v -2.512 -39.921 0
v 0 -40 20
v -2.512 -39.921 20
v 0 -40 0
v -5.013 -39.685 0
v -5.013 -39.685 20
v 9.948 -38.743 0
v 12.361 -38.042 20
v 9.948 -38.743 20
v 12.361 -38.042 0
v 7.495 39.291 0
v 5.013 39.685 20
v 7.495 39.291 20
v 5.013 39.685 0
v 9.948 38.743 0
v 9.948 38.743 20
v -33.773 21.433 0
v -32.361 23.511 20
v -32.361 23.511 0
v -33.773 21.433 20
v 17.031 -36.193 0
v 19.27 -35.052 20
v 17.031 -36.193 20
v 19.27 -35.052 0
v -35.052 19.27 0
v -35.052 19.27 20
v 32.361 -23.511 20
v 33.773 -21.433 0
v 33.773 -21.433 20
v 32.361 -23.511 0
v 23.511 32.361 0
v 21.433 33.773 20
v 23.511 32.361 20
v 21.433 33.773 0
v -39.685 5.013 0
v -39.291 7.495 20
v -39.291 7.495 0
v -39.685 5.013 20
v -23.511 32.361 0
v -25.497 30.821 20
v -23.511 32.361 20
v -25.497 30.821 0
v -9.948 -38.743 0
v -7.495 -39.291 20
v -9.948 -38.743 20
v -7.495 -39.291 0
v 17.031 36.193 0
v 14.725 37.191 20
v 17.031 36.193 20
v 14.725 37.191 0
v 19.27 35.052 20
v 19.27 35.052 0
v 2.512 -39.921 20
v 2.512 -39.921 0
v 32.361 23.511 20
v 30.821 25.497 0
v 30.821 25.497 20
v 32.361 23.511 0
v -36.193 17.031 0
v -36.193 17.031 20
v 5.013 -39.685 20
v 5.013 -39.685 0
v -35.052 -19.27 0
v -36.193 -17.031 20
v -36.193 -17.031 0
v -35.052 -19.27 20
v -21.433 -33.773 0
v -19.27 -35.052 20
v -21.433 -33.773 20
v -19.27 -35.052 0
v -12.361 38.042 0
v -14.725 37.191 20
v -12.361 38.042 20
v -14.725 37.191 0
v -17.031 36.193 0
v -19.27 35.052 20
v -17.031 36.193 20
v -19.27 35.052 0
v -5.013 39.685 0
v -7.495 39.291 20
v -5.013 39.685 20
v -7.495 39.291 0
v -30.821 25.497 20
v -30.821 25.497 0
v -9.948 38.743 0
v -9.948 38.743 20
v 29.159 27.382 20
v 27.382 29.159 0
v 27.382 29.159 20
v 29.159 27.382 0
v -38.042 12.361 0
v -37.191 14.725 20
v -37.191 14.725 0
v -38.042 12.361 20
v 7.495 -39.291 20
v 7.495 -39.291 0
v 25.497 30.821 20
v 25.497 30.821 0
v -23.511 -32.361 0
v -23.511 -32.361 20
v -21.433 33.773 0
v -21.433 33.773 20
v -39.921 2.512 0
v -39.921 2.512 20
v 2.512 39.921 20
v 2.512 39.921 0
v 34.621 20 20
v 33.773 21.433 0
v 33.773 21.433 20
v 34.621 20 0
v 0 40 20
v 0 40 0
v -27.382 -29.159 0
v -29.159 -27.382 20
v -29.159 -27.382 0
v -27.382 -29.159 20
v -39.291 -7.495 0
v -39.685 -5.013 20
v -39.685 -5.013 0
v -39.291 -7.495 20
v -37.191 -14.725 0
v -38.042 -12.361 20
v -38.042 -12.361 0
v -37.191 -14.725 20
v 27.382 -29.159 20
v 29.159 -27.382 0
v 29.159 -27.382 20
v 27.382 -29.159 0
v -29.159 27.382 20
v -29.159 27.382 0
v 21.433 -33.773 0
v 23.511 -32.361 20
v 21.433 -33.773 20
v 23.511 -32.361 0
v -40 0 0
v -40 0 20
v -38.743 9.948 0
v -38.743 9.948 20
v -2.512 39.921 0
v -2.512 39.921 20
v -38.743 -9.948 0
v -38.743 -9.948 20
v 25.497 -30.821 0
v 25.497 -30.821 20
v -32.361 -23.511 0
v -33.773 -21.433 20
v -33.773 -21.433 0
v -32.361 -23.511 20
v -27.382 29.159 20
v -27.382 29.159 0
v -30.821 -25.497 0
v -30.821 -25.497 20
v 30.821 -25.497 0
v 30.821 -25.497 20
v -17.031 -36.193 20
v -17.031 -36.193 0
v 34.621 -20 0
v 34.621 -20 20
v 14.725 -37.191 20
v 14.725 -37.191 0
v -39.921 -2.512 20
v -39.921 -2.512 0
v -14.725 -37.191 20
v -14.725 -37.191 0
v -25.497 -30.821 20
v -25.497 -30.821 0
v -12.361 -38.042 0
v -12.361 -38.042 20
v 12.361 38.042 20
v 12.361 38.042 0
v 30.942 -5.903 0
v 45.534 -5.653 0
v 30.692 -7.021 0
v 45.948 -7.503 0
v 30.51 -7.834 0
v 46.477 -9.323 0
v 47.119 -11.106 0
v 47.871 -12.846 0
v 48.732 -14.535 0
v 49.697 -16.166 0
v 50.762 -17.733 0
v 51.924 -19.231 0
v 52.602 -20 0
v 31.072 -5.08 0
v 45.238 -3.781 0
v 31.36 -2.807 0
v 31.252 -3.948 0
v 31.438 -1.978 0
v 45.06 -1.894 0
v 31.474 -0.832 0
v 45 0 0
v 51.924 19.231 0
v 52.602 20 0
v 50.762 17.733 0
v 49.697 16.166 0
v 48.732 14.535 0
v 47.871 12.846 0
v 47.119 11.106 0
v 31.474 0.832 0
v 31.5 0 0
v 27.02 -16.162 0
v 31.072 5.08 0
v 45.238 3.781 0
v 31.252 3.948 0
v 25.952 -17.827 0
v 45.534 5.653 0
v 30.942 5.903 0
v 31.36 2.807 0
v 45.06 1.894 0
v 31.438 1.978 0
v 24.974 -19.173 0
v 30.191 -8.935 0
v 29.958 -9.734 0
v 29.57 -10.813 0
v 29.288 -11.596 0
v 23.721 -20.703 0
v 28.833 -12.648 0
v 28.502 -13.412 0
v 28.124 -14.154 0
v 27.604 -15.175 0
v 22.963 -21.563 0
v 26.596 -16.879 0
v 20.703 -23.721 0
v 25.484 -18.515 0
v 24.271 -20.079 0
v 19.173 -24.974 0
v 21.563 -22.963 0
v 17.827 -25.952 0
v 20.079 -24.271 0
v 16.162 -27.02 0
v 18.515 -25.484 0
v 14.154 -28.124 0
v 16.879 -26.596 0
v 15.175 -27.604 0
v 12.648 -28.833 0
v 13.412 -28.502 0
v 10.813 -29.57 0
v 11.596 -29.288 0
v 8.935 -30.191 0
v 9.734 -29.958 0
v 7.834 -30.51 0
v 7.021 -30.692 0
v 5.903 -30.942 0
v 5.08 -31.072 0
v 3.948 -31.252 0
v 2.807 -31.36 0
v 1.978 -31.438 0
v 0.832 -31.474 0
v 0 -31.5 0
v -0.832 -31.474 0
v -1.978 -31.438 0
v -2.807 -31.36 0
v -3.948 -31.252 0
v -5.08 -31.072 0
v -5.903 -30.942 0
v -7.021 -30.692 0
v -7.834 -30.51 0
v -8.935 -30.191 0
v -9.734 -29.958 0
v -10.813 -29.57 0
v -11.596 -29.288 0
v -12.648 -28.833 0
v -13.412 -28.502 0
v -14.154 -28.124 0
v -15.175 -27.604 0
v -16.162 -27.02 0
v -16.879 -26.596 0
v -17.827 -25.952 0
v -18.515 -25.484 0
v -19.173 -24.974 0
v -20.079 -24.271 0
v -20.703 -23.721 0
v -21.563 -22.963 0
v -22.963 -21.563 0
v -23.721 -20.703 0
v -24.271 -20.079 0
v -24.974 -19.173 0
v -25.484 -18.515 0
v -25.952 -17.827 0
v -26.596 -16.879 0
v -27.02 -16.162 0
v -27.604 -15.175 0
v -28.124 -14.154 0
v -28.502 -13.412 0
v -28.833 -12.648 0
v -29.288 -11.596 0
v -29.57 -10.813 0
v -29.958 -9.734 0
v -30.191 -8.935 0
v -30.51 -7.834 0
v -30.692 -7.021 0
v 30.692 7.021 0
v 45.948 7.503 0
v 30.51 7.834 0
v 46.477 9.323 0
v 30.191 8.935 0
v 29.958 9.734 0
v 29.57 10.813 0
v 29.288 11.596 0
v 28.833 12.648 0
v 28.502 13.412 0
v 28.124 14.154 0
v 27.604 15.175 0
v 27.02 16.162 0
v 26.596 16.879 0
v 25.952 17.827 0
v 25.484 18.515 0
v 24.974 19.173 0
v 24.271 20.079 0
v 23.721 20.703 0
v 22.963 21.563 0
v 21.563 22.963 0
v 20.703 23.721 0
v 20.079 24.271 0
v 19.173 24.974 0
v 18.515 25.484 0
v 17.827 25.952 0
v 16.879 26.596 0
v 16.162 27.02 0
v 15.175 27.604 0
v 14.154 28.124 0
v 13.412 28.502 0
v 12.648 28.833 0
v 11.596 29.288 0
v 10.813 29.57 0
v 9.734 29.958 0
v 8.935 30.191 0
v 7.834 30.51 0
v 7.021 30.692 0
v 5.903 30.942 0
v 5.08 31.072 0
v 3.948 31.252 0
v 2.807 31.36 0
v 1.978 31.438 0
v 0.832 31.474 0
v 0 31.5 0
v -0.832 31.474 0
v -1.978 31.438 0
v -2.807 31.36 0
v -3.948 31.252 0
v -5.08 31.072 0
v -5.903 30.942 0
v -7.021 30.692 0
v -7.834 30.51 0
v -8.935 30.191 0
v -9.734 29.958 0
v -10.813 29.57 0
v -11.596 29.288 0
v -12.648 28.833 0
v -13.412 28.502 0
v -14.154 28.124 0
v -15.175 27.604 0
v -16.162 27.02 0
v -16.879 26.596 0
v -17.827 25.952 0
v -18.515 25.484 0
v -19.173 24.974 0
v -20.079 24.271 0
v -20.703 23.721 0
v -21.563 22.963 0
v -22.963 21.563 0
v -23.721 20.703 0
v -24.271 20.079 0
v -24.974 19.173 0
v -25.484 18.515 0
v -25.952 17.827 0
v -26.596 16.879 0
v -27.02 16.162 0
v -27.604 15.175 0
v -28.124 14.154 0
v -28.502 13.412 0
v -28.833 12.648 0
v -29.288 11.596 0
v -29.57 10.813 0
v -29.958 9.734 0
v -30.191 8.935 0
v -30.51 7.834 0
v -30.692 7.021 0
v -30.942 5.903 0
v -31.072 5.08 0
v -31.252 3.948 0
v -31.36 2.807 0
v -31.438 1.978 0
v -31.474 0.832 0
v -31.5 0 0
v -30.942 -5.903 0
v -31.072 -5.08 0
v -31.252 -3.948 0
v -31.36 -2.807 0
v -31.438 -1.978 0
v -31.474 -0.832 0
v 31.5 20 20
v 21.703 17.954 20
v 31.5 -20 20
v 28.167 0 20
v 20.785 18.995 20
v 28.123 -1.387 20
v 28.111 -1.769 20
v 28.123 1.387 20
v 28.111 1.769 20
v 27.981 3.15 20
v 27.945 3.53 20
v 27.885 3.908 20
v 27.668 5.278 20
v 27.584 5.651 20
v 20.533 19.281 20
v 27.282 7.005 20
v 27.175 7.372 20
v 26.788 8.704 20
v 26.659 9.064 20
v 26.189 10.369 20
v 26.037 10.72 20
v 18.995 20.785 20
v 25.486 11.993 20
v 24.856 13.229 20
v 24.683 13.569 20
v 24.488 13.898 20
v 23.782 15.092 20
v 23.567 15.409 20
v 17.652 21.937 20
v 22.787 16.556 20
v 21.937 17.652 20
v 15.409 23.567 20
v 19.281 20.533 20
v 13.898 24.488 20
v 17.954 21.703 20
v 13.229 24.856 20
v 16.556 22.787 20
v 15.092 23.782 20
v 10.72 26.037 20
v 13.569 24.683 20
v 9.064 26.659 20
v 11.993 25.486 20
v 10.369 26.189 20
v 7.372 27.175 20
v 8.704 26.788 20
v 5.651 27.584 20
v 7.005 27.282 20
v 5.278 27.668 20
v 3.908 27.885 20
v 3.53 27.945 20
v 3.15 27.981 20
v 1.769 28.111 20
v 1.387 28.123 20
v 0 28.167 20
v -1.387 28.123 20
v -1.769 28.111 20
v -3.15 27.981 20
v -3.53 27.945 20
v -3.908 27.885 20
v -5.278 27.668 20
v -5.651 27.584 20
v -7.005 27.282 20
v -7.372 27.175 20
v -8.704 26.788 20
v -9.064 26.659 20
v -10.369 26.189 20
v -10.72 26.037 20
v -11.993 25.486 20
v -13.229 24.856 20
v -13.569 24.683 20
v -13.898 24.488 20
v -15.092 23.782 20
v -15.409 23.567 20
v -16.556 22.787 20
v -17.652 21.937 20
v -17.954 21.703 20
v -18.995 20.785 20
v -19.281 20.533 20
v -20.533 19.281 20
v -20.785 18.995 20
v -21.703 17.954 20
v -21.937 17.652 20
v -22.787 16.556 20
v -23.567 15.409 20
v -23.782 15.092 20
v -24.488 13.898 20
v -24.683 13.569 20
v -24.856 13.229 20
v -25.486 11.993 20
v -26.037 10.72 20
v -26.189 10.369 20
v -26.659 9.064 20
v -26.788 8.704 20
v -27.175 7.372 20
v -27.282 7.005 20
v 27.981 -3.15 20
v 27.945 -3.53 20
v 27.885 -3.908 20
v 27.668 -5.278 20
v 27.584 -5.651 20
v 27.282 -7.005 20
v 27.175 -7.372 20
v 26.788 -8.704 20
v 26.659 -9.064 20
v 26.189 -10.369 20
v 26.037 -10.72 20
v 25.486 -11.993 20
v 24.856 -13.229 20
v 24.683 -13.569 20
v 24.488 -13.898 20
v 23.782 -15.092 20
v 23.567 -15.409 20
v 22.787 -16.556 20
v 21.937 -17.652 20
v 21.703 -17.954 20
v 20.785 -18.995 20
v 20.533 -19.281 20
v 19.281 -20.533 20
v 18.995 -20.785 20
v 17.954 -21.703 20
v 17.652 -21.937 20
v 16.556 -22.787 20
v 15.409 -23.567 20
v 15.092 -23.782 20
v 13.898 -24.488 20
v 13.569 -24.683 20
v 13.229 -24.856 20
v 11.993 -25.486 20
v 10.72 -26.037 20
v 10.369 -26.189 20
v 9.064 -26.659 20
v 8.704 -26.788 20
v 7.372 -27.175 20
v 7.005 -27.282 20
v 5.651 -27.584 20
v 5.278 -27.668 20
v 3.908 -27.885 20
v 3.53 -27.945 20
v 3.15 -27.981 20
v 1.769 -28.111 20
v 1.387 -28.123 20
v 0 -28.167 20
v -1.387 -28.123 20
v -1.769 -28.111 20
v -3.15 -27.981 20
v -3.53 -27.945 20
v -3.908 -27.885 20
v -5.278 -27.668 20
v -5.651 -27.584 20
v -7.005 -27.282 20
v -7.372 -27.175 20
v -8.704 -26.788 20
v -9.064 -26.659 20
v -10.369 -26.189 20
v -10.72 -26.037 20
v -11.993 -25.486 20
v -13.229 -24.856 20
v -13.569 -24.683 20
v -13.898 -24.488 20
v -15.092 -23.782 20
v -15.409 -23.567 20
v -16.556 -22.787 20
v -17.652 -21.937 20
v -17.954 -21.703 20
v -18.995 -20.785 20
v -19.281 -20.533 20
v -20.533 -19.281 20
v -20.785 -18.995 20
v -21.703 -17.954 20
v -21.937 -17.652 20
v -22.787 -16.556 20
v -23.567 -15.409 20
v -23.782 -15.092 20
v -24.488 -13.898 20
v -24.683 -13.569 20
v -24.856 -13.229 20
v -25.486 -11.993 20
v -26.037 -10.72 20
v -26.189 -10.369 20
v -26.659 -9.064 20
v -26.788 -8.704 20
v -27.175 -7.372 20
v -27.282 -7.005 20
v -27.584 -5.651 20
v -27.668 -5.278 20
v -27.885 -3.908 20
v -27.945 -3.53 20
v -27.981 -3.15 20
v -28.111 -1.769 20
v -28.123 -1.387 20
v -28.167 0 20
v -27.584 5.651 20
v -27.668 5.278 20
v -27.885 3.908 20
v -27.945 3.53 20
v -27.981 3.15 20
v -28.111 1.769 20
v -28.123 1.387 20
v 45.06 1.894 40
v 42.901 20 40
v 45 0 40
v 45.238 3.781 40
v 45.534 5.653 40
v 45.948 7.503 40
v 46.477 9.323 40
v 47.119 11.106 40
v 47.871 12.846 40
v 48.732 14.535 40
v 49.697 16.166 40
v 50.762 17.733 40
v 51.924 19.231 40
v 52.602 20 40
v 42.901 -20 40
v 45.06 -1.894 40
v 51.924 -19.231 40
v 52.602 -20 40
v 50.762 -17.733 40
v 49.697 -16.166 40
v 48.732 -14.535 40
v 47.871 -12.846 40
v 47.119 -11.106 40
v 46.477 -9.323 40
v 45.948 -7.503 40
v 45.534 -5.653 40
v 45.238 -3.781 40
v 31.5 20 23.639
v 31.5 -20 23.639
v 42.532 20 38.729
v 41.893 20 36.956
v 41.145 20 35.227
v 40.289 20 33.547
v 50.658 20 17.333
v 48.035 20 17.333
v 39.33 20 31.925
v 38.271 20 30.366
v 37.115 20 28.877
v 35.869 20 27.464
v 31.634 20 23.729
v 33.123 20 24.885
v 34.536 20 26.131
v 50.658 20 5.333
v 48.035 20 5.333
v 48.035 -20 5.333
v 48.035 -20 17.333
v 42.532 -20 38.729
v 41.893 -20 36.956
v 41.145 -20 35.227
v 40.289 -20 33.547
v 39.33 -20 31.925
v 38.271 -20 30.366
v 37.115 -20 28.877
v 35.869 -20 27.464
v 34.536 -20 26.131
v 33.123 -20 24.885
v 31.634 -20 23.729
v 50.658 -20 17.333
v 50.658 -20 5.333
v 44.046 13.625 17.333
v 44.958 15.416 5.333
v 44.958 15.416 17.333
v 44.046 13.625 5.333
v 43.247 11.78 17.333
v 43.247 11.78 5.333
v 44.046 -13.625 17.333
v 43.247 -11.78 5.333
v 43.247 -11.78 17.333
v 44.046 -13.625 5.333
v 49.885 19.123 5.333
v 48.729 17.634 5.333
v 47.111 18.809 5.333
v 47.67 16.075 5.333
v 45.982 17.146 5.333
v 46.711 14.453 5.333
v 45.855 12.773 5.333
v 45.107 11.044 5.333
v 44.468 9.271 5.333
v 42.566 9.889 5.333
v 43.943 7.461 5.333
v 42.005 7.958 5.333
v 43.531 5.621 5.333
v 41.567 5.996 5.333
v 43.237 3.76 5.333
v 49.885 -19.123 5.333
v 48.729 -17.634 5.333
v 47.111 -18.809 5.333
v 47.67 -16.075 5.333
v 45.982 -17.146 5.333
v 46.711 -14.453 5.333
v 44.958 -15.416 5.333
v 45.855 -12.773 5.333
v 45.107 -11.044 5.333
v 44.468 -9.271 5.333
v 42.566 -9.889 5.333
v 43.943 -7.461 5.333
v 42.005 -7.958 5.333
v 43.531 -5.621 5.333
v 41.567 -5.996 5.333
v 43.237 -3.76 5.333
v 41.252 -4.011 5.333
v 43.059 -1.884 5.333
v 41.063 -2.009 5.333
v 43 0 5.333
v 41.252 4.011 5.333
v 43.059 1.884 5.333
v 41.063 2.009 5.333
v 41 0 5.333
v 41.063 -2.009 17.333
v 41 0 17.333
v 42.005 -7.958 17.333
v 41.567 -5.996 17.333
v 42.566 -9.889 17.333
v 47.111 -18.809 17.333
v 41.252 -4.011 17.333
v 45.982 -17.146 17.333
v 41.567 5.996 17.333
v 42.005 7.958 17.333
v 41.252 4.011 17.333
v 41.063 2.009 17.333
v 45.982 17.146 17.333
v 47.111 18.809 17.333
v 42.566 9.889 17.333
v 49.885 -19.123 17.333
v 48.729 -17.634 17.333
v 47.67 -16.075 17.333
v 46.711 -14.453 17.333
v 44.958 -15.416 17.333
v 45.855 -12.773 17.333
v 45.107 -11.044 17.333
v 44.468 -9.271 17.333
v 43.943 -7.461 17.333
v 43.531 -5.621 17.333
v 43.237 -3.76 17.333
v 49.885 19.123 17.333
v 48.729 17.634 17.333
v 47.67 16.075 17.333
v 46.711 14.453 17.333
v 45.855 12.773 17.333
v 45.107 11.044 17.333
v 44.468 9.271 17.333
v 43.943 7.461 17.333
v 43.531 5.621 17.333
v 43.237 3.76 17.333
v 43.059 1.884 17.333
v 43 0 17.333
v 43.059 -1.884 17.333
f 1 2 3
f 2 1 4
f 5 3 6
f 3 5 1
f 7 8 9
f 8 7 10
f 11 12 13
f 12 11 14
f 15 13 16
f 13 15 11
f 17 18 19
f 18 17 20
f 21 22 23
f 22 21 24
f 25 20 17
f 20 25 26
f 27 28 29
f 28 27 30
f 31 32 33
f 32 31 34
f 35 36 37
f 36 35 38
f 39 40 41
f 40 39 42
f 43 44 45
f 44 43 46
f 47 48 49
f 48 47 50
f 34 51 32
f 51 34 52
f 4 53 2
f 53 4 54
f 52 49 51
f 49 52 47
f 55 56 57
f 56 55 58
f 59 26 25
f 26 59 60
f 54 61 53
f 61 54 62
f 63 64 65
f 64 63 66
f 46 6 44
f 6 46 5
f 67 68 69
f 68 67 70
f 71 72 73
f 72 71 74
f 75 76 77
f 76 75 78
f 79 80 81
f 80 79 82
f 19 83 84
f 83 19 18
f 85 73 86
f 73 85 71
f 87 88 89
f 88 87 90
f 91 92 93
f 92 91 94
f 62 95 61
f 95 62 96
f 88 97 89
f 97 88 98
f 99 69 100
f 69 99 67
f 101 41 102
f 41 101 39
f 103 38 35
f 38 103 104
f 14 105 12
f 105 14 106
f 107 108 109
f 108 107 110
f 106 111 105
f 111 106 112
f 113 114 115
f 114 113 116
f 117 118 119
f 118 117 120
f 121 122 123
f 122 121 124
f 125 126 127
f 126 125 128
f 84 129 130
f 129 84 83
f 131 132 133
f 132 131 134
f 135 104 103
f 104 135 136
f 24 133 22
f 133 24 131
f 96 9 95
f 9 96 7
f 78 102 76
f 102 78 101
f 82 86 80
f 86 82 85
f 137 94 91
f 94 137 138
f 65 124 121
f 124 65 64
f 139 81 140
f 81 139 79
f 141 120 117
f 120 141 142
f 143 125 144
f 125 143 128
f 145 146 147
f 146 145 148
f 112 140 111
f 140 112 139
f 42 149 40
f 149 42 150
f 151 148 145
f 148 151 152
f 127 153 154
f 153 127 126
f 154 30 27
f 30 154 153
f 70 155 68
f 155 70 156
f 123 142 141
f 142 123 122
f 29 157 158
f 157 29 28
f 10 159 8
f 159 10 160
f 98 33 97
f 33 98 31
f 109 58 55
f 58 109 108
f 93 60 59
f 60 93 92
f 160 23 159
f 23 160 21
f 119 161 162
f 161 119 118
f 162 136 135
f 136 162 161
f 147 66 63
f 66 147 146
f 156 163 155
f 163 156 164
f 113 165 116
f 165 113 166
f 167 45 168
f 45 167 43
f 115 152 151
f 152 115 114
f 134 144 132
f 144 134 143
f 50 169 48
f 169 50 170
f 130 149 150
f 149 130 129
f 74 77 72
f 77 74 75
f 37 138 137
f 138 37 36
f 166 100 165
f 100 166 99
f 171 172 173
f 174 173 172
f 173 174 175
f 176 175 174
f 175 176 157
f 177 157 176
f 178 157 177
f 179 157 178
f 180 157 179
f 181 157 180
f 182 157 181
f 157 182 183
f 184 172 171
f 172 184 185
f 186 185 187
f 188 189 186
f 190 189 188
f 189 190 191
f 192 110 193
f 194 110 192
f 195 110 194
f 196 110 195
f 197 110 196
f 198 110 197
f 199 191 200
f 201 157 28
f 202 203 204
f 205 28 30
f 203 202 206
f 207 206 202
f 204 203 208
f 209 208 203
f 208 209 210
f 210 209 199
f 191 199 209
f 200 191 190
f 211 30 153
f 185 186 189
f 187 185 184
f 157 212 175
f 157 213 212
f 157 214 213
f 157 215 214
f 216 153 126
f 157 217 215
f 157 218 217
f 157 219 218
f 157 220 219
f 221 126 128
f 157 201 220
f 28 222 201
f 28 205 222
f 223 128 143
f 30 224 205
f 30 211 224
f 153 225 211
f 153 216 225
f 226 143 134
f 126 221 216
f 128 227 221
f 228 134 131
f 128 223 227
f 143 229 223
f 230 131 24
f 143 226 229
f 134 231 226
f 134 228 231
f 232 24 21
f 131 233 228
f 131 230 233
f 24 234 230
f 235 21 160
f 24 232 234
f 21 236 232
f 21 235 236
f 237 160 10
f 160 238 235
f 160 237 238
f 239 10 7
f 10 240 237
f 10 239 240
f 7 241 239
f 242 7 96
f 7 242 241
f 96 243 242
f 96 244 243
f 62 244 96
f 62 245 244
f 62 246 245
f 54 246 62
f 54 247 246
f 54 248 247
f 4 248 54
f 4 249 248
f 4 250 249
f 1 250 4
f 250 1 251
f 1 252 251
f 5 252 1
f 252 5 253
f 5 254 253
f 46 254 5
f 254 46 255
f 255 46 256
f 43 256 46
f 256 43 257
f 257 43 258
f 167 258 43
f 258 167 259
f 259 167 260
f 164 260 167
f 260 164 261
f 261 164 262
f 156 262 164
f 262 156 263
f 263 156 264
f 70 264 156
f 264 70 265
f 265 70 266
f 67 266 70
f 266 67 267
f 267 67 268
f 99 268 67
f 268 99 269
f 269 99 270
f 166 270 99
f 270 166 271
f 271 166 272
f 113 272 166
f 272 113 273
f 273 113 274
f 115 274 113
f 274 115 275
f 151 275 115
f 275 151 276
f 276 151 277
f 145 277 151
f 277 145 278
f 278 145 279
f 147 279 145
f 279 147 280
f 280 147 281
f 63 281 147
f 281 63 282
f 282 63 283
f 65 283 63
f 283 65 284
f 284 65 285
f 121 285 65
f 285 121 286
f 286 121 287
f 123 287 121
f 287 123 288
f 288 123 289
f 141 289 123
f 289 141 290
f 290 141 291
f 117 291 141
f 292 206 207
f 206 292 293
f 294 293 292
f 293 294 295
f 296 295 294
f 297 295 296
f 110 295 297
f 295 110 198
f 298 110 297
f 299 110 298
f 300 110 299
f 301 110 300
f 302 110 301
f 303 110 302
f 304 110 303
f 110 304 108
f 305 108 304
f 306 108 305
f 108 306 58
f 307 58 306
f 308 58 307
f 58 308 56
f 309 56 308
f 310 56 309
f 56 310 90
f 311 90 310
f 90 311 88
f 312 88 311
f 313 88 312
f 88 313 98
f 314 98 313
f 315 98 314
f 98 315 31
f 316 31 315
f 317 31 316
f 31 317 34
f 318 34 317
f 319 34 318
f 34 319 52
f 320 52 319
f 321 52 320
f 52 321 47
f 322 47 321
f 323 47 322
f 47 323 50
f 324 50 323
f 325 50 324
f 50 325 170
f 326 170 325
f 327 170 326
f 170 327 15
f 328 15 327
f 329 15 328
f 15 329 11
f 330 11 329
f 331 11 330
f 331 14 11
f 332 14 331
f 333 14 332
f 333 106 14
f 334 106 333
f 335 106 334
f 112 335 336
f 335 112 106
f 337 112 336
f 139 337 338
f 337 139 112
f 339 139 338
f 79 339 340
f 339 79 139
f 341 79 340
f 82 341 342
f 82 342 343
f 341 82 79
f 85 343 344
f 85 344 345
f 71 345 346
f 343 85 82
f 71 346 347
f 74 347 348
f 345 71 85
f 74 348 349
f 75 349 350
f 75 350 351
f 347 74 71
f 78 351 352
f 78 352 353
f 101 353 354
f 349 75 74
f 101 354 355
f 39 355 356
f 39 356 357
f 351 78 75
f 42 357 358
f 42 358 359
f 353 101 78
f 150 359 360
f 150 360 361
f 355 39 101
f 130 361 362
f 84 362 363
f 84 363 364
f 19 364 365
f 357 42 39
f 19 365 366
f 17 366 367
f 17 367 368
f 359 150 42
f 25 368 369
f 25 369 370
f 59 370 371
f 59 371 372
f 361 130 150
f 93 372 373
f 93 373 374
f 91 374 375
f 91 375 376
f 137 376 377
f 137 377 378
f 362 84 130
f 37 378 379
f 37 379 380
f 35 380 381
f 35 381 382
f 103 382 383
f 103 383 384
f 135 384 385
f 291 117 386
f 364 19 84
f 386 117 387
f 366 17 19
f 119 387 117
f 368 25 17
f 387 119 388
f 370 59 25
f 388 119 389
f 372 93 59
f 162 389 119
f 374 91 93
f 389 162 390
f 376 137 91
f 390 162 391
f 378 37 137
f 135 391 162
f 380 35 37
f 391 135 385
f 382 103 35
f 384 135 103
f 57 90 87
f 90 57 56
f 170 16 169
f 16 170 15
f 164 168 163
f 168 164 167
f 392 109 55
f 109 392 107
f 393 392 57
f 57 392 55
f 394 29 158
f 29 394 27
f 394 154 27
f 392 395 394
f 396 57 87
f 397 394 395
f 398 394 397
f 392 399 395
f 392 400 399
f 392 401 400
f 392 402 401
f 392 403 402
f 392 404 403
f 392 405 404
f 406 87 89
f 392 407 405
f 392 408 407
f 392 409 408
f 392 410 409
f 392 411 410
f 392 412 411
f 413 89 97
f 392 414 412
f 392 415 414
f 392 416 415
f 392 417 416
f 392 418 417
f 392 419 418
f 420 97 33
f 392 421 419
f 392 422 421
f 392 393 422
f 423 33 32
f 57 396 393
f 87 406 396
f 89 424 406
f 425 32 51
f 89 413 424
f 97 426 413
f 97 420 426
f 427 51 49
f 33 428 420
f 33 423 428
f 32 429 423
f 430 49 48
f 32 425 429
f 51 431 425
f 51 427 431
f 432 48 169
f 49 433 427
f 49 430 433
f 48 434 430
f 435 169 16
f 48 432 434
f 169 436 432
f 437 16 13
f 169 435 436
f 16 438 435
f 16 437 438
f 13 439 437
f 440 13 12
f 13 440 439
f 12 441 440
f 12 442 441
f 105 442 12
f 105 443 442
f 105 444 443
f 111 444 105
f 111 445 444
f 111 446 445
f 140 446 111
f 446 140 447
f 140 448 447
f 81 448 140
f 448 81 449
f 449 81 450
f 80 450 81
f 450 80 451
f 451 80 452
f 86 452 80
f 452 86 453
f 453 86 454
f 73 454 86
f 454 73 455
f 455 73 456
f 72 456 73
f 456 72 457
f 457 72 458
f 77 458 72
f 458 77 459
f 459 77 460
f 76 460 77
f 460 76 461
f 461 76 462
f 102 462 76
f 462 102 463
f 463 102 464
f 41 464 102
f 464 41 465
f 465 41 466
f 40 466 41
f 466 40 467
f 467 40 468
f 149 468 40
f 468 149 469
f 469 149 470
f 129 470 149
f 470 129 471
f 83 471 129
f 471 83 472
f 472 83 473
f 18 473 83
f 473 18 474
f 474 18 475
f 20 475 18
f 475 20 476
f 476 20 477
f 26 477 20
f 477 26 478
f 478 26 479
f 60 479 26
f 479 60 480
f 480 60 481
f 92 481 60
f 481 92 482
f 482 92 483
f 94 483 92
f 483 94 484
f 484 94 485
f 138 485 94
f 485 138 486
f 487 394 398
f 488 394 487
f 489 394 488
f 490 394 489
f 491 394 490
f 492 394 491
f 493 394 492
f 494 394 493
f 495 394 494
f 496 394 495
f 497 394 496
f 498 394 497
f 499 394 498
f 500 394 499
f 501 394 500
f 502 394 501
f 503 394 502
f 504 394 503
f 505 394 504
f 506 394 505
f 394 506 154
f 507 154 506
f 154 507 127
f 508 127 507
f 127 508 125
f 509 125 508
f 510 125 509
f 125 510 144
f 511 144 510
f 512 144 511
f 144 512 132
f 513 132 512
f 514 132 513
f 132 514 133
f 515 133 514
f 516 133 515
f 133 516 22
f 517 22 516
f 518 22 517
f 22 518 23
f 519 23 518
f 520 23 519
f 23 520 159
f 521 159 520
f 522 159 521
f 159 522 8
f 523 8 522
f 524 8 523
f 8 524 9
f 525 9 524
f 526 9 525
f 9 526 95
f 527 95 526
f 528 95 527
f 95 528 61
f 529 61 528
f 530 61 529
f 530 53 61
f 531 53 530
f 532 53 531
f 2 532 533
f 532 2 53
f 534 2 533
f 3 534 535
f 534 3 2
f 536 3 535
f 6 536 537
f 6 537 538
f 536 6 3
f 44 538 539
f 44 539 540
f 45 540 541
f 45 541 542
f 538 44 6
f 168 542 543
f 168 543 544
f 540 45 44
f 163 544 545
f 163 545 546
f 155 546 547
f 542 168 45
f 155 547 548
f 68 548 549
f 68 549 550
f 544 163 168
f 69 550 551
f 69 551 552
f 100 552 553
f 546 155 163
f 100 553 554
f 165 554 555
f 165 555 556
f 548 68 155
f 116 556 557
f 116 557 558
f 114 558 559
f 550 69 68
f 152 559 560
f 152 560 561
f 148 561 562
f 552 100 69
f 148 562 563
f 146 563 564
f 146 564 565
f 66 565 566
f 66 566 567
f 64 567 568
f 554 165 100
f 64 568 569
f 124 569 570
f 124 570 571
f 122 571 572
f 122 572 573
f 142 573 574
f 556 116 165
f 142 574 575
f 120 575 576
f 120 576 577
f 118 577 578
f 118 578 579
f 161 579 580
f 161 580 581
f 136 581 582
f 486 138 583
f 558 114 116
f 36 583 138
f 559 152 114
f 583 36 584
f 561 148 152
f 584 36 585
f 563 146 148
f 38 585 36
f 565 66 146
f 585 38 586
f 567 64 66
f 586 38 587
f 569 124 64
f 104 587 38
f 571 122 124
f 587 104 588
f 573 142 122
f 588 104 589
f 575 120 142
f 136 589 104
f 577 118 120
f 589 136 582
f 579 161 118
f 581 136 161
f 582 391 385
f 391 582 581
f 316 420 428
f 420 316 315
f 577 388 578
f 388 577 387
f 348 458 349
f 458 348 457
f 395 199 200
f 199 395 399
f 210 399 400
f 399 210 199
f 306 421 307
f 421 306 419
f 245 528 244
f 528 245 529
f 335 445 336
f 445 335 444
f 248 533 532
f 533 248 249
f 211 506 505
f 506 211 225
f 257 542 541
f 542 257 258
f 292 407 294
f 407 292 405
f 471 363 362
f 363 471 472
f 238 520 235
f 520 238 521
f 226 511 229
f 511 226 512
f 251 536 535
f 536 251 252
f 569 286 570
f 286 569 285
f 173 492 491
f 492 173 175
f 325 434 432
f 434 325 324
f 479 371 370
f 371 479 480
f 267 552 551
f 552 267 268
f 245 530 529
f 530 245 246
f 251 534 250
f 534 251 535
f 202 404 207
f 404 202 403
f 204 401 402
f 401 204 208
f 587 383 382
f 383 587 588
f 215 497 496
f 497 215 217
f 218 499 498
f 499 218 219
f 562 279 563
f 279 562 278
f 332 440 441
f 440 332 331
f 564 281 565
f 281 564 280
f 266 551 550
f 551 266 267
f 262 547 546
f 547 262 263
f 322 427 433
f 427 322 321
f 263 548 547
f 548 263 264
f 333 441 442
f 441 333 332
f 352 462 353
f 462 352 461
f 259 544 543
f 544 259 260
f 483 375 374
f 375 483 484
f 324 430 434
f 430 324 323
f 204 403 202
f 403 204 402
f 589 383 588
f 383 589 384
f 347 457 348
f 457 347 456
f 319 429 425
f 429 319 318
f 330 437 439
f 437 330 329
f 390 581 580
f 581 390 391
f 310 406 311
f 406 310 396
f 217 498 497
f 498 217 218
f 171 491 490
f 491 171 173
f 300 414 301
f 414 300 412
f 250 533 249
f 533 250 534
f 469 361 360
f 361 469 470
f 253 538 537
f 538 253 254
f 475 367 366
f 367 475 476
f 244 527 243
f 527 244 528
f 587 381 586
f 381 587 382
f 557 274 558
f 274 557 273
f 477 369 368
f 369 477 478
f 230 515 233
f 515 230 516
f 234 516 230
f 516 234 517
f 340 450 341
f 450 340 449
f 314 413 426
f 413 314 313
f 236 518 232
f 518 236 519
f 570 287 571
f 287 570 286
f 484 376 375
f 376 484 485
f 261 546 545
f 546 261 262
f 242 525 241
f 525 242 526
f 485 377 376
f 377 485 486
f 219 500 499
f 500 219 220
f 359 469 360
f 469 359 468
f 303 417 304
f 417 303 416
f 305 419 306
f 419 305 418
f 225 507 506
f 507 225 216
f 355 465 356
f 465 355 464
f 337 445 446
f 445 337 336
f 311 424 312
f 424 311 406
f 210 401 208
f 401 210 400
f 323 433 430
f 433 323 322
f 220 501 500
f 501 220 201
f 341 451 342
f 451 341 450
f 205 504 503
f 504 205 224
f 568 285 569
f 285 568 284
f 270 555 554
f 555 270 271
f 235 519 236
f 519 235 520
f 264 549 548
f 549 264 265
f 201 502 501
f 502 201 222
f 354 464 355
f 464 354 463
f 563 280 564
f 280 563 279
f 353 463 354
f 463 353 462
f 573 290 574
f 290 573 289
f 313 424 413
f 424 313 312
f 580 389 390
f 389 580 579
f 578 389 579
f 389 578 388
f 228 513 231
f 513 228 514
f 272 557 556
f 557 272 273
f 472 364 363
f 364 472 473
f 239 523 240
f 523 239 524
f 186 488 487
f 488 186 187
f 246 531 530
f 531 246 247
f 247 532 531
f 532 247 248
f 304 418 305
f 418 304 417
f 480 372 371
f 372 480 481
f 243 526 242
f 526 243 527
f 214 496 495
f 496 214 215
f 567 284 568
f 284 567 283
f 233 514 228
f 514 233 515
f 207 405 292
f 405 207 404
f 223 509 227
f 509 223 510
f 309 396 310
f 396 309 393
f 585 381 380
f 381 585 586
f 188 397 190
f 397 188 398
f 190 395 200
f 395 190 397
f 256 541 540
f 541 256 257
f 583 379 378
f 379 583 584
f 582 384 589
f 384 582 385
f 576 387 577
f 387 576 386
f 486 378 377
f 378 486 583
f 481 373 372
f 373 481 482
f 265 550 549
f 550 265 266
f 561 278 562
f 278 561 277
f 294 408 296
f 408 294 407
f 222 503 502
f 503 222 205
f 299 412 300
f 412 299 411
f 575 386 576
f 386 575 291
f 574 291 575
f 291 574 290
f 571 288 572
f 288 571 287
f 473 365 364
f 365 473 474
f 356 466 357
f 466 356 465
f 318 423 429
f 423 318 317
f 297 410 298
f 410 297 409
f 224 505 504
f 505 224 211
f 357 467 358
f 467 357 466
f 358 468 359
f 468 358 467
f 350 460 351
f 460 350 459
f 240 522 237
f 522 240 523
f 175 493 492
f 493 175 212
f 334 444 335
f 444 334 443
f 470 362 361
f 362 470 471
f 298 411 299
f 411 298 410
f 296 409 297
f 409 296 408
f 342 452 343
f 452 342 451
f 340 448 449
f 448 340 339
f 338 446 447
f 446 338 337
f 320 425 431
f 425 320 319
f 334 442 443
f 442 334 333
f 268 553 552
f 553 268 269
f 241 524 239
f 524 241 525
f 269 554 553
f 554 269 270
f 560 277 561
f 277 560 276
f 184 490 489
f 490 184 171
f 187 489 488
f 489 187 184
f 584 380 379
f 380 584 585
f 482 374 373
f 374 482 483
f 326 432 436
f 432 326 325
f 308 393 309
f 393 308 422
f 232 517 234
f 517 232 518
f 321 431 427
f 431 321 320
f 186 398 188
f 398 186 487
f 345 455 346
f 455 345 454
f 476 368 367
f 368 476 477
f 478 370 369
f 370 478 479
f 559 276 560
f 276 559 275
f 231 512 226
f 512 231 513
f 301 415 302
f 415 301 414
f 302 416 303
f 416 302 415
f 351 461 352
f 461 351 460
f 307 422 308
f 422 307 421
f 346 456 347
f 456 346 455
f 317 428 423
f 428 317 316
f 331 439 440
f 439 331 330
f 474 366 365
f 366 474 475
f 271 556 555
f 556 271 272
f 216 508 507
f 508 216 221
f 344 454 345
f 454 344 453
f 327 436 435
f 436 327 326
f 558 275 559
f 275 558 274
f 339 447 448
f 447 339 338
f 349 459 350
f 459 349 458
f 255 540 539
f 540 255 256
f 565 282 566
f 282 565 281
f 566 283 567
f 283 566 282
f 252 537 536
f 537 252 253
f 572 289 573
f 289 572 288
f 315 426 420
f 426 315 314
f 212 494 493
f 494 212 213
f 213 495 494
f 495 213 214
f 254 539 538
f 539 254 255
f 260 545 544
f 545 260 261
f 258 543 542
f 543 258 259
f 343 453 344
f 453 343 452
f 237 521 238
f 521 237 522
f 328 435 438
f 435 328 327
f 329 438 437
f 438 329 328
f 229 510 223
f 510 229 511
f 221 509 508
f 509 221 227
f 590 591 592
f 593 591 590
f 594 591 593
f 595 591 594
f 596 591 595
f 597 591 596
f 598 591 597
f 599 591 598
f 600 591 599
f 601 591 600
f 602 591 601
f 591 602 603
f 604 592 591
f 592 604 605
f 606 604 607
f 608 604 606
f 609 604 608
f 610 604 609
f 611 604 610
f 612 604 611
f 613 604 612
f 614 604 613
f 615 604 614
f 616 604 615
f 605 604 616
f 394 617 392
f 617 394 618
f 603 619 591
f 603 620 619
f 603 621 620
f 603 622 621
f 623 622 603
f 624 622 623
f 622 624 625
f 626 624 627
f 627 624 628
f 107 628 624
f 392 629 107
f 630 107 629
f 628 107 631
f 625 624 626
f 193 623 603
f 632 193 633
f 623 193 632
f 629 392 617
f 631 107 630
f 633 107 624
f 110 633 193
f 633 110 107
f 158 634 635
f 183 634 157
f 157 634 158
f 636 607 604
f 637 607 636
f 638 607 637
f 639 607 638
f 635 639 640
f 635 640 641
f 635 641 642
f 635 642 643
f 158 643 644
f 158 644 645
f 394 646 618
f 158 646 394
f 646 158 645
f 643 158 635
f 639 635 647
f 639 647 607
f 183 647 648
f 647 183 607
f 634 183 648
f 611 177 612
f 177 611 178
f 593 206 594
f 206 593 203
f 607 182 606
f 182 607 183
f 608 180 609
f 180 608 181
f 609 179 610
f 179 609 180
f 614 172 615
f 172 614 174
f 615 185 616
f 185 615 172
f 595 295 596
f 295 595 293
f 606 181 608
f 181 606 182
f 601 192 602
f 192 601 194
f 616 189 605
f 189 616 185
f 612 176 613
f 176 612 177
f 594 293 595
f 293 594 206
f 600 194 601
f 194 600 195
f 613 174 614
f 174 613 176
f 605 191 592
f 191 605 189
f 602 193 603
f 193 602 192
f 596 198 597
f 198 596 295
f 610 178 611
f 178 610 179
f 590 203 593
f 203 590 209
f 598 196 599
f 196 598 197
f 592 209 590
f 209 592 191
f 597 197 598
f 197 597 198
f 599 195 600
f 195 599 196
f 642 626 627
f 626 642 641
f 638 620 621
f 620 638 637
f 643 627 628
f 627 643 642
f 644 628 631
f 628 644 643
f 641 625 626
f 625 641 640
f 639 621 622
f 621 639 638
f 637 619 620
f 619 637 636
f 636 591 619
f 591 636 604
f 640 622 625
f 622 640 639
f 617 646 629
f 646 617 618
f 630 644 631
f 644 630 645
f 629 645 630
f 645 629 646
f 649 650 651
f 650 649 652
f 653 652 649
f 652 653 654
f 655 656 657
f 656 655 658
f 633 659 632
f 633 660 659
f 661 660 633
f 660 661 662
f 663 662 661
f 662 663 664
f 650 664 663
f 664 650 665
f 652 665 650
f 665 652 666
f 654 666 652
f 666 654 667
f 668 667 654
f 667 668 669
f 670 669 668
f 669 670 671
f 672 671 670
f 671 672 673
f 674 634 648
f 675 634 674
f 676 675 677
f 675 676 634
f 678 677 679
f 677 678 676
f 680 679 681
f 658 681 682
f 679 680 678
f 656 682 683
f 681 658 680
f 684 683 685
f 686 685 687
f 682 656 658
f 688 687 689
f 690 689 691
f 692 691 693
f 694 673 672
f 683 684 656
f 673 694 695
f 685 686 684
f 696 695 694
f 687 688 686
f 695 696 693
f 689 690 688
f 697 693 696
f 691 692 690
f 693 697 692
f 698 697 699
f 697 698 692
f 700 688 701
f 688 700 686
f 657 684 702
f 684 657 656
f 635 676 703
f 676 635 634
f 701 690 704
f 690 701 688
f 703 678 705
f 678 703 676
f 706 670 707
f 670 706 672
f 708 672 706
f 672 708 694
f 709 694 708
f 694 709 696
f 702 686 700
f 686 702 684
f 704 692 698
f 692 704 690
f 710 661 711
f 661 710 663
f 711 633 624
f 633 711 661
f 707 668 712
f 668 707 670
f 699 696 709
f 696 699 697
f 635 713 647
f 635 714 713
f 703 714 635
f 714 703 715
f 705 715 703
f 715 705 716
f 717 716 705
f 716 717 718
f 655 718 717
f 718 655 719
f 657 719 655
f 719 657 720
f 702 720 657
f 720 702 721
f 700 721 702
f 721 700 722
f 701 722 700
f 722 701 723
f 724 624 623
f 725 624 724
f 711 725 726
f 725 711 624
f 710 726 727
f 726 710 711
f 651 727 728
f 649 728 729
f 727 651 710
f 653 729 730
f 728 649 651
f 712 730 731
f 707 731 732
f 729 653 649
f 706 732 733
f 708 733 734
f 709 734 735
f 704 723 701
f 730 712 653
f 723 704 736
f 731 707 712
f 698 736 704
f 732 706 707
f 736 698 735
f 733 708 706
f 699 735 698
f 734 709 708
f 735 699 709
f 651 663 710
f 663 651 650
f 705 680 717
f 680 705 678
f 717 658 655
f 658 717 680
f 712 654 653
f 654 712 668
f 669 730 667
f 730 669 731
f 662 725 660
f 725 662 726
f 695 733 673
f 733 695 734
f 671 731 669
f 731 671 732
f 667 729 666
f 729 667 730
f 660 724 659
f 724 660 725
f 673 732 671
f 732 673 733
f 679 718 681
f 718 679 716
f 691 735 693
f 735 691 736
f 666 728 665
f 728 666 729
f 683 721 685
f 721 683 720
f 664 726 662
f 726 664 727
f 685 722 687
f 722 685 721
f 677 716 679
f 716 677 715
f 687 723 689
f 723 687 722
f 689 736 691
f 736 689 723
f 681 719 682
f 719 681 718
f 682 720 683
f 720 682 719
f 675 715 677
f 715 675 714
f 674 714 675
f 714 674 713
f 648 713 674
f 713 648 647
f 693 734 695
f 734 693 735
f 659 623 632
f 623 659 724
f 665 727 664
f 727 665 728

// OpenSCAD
/* NOTES:
	writecylinder(text="text",where=[0,0,0],radius=20,height=40);
	
	Required Parameters (If supplied in this order, identifier is not required)
		text="text"	 	: Text to be written
		where=[x,y,z]	: coordinates of cylinder
		radius=mm 		: radius of cylinder
		height=mm 		: height of cylinder

	Optional Parameter:
		center=boolean :	use this to specify that cylinder is centered on coordinates
					(default is center=false)
		face="top" : Top of cylinder
		face="bottom": bottom of cylinder
		face="front" :barrel of cylinder (default if not supplied)	

	Optional Parameters: (face is not "top" or "bottom")
		east=degrees : west= degrees: (moves text east or west around z)
		up=mm or down=mm : moves text up or down along Z axis
		rotate=degrees : rotates text around Y axis (spirals around cylinder)
	
	Optional Parameters: (face="top" or face="bottom")
		east=degrees or west=degrees : rotate text east or west around top
		rotate=degrees : (similar to east west but not dependant on text orientation)
		ccw=boolean : If true, writes in a counter clockwise direction. (default=false)
		middle=mm :moves the text ?mm toward center of top or bottom surface 	

*/

use <WriteSVG.scad>


 //-- Parmetros del vaso
/* grosor = 20;
 diam_ext=80;
 diam_int = 63.3; 
 texto = "Gonzalo";
diam_tubo = 60;
*/

// Aro
module aro(grosor_aro=20,  diam_ext=80, diam_int = 63.3, texto = "Gonzalo")
{
 // Exterior Aro
 difference(){
  difference() {
     //-- Base de la rueda
    cylinder(r=diam_ext/2,h=grosor_aro,  $fn=100);
	rotate([0,180,-90])
	translate([0,0,-20])
    	writecylinder(texto,[0,0,0],diam_ext/2-0.7,grosor_aro);
   } 

    //-- Taladro aro
   cylinder(r1=diam_int/2+5, r2=diam_int/2-5,h=grosor_aro*3,$fn=100,center=true);
 }
}

//Base asa
module base_asa(altura=40, diam_int = 63.3, diam_ext=80, diam_tubo = 60)
{
difference(){
difference(){
 translate([diam_int/2,-20,0])
 cube([30,40,altura]);

translate([(diam_ext+diam_tubo)/2+5,0,altura/2])
  cylinder(r=diam_tubo/2, h=altura*2,$fn=100,center=true);
}

translate([14,21,48])
rotate([90,0,0])
cylinder(r=60/2,h=42,  $fn=100);
}
}

//Cuerpdel soporte del vaso
module cuerpo_sv(grosor_aro=20,  diam_ext=80, diam_int = 63, texto = "Gonzalo",altura=40, diam_tubo = 60.34){
 aro(grosor_aro,  diam_ext, diam_int, texto);
 base_asa(altura, diam_int, diam_ext, diam_tubo);
}

module agarradera( diam_ext=80, diam_int = 63.3, altura_ag=12, ancho_ag=2, diam_tubo = 60){
difference(){
  	translate([(diam_ext+diam_tubo)/2+3,0,0])
	cylinder(r=diam_tubo/2+ancho_ag, h=altura_ag,$fn=100);

  	translate([(diam_ext+diam_tubo)/2+3,0,-altura_ag*2])
	cylinder(r=diam_tubo/2, h=altura_ag*4,$fn=100);
}
}

module agarraderas( altura_asa=40, diam_ext=80, diam_int = 63.3, altura_ag=12, ancho_ag=2, diam_tubo = 60){
separacion=(altura_asa-altura_ag*2)/3;
translate([0,0,separacion])
agarradera(diam_ext, diam_int , altura_ag, ancho_ag, diam_tubo );

// Una agarradera es suficiente. La de más abajo no es necesaria
/*translate([0,0,separacion*2+altura_ag])
agarradera(diam_ext, diam_int , altura_ag, ancho_ag, diam_tubo );
*/
}

module soporte_vaso(){
	difference(){	
		cuerpo_sv();
		agarraderas();
	}
}
/*difference(){	
soporte_vaso();
color("Red")
translate([14,21,48])
rotate([90,0,0])
cylinder(r=60/2,h=42,  $fn=100);
}*/

soporte_vaso();
